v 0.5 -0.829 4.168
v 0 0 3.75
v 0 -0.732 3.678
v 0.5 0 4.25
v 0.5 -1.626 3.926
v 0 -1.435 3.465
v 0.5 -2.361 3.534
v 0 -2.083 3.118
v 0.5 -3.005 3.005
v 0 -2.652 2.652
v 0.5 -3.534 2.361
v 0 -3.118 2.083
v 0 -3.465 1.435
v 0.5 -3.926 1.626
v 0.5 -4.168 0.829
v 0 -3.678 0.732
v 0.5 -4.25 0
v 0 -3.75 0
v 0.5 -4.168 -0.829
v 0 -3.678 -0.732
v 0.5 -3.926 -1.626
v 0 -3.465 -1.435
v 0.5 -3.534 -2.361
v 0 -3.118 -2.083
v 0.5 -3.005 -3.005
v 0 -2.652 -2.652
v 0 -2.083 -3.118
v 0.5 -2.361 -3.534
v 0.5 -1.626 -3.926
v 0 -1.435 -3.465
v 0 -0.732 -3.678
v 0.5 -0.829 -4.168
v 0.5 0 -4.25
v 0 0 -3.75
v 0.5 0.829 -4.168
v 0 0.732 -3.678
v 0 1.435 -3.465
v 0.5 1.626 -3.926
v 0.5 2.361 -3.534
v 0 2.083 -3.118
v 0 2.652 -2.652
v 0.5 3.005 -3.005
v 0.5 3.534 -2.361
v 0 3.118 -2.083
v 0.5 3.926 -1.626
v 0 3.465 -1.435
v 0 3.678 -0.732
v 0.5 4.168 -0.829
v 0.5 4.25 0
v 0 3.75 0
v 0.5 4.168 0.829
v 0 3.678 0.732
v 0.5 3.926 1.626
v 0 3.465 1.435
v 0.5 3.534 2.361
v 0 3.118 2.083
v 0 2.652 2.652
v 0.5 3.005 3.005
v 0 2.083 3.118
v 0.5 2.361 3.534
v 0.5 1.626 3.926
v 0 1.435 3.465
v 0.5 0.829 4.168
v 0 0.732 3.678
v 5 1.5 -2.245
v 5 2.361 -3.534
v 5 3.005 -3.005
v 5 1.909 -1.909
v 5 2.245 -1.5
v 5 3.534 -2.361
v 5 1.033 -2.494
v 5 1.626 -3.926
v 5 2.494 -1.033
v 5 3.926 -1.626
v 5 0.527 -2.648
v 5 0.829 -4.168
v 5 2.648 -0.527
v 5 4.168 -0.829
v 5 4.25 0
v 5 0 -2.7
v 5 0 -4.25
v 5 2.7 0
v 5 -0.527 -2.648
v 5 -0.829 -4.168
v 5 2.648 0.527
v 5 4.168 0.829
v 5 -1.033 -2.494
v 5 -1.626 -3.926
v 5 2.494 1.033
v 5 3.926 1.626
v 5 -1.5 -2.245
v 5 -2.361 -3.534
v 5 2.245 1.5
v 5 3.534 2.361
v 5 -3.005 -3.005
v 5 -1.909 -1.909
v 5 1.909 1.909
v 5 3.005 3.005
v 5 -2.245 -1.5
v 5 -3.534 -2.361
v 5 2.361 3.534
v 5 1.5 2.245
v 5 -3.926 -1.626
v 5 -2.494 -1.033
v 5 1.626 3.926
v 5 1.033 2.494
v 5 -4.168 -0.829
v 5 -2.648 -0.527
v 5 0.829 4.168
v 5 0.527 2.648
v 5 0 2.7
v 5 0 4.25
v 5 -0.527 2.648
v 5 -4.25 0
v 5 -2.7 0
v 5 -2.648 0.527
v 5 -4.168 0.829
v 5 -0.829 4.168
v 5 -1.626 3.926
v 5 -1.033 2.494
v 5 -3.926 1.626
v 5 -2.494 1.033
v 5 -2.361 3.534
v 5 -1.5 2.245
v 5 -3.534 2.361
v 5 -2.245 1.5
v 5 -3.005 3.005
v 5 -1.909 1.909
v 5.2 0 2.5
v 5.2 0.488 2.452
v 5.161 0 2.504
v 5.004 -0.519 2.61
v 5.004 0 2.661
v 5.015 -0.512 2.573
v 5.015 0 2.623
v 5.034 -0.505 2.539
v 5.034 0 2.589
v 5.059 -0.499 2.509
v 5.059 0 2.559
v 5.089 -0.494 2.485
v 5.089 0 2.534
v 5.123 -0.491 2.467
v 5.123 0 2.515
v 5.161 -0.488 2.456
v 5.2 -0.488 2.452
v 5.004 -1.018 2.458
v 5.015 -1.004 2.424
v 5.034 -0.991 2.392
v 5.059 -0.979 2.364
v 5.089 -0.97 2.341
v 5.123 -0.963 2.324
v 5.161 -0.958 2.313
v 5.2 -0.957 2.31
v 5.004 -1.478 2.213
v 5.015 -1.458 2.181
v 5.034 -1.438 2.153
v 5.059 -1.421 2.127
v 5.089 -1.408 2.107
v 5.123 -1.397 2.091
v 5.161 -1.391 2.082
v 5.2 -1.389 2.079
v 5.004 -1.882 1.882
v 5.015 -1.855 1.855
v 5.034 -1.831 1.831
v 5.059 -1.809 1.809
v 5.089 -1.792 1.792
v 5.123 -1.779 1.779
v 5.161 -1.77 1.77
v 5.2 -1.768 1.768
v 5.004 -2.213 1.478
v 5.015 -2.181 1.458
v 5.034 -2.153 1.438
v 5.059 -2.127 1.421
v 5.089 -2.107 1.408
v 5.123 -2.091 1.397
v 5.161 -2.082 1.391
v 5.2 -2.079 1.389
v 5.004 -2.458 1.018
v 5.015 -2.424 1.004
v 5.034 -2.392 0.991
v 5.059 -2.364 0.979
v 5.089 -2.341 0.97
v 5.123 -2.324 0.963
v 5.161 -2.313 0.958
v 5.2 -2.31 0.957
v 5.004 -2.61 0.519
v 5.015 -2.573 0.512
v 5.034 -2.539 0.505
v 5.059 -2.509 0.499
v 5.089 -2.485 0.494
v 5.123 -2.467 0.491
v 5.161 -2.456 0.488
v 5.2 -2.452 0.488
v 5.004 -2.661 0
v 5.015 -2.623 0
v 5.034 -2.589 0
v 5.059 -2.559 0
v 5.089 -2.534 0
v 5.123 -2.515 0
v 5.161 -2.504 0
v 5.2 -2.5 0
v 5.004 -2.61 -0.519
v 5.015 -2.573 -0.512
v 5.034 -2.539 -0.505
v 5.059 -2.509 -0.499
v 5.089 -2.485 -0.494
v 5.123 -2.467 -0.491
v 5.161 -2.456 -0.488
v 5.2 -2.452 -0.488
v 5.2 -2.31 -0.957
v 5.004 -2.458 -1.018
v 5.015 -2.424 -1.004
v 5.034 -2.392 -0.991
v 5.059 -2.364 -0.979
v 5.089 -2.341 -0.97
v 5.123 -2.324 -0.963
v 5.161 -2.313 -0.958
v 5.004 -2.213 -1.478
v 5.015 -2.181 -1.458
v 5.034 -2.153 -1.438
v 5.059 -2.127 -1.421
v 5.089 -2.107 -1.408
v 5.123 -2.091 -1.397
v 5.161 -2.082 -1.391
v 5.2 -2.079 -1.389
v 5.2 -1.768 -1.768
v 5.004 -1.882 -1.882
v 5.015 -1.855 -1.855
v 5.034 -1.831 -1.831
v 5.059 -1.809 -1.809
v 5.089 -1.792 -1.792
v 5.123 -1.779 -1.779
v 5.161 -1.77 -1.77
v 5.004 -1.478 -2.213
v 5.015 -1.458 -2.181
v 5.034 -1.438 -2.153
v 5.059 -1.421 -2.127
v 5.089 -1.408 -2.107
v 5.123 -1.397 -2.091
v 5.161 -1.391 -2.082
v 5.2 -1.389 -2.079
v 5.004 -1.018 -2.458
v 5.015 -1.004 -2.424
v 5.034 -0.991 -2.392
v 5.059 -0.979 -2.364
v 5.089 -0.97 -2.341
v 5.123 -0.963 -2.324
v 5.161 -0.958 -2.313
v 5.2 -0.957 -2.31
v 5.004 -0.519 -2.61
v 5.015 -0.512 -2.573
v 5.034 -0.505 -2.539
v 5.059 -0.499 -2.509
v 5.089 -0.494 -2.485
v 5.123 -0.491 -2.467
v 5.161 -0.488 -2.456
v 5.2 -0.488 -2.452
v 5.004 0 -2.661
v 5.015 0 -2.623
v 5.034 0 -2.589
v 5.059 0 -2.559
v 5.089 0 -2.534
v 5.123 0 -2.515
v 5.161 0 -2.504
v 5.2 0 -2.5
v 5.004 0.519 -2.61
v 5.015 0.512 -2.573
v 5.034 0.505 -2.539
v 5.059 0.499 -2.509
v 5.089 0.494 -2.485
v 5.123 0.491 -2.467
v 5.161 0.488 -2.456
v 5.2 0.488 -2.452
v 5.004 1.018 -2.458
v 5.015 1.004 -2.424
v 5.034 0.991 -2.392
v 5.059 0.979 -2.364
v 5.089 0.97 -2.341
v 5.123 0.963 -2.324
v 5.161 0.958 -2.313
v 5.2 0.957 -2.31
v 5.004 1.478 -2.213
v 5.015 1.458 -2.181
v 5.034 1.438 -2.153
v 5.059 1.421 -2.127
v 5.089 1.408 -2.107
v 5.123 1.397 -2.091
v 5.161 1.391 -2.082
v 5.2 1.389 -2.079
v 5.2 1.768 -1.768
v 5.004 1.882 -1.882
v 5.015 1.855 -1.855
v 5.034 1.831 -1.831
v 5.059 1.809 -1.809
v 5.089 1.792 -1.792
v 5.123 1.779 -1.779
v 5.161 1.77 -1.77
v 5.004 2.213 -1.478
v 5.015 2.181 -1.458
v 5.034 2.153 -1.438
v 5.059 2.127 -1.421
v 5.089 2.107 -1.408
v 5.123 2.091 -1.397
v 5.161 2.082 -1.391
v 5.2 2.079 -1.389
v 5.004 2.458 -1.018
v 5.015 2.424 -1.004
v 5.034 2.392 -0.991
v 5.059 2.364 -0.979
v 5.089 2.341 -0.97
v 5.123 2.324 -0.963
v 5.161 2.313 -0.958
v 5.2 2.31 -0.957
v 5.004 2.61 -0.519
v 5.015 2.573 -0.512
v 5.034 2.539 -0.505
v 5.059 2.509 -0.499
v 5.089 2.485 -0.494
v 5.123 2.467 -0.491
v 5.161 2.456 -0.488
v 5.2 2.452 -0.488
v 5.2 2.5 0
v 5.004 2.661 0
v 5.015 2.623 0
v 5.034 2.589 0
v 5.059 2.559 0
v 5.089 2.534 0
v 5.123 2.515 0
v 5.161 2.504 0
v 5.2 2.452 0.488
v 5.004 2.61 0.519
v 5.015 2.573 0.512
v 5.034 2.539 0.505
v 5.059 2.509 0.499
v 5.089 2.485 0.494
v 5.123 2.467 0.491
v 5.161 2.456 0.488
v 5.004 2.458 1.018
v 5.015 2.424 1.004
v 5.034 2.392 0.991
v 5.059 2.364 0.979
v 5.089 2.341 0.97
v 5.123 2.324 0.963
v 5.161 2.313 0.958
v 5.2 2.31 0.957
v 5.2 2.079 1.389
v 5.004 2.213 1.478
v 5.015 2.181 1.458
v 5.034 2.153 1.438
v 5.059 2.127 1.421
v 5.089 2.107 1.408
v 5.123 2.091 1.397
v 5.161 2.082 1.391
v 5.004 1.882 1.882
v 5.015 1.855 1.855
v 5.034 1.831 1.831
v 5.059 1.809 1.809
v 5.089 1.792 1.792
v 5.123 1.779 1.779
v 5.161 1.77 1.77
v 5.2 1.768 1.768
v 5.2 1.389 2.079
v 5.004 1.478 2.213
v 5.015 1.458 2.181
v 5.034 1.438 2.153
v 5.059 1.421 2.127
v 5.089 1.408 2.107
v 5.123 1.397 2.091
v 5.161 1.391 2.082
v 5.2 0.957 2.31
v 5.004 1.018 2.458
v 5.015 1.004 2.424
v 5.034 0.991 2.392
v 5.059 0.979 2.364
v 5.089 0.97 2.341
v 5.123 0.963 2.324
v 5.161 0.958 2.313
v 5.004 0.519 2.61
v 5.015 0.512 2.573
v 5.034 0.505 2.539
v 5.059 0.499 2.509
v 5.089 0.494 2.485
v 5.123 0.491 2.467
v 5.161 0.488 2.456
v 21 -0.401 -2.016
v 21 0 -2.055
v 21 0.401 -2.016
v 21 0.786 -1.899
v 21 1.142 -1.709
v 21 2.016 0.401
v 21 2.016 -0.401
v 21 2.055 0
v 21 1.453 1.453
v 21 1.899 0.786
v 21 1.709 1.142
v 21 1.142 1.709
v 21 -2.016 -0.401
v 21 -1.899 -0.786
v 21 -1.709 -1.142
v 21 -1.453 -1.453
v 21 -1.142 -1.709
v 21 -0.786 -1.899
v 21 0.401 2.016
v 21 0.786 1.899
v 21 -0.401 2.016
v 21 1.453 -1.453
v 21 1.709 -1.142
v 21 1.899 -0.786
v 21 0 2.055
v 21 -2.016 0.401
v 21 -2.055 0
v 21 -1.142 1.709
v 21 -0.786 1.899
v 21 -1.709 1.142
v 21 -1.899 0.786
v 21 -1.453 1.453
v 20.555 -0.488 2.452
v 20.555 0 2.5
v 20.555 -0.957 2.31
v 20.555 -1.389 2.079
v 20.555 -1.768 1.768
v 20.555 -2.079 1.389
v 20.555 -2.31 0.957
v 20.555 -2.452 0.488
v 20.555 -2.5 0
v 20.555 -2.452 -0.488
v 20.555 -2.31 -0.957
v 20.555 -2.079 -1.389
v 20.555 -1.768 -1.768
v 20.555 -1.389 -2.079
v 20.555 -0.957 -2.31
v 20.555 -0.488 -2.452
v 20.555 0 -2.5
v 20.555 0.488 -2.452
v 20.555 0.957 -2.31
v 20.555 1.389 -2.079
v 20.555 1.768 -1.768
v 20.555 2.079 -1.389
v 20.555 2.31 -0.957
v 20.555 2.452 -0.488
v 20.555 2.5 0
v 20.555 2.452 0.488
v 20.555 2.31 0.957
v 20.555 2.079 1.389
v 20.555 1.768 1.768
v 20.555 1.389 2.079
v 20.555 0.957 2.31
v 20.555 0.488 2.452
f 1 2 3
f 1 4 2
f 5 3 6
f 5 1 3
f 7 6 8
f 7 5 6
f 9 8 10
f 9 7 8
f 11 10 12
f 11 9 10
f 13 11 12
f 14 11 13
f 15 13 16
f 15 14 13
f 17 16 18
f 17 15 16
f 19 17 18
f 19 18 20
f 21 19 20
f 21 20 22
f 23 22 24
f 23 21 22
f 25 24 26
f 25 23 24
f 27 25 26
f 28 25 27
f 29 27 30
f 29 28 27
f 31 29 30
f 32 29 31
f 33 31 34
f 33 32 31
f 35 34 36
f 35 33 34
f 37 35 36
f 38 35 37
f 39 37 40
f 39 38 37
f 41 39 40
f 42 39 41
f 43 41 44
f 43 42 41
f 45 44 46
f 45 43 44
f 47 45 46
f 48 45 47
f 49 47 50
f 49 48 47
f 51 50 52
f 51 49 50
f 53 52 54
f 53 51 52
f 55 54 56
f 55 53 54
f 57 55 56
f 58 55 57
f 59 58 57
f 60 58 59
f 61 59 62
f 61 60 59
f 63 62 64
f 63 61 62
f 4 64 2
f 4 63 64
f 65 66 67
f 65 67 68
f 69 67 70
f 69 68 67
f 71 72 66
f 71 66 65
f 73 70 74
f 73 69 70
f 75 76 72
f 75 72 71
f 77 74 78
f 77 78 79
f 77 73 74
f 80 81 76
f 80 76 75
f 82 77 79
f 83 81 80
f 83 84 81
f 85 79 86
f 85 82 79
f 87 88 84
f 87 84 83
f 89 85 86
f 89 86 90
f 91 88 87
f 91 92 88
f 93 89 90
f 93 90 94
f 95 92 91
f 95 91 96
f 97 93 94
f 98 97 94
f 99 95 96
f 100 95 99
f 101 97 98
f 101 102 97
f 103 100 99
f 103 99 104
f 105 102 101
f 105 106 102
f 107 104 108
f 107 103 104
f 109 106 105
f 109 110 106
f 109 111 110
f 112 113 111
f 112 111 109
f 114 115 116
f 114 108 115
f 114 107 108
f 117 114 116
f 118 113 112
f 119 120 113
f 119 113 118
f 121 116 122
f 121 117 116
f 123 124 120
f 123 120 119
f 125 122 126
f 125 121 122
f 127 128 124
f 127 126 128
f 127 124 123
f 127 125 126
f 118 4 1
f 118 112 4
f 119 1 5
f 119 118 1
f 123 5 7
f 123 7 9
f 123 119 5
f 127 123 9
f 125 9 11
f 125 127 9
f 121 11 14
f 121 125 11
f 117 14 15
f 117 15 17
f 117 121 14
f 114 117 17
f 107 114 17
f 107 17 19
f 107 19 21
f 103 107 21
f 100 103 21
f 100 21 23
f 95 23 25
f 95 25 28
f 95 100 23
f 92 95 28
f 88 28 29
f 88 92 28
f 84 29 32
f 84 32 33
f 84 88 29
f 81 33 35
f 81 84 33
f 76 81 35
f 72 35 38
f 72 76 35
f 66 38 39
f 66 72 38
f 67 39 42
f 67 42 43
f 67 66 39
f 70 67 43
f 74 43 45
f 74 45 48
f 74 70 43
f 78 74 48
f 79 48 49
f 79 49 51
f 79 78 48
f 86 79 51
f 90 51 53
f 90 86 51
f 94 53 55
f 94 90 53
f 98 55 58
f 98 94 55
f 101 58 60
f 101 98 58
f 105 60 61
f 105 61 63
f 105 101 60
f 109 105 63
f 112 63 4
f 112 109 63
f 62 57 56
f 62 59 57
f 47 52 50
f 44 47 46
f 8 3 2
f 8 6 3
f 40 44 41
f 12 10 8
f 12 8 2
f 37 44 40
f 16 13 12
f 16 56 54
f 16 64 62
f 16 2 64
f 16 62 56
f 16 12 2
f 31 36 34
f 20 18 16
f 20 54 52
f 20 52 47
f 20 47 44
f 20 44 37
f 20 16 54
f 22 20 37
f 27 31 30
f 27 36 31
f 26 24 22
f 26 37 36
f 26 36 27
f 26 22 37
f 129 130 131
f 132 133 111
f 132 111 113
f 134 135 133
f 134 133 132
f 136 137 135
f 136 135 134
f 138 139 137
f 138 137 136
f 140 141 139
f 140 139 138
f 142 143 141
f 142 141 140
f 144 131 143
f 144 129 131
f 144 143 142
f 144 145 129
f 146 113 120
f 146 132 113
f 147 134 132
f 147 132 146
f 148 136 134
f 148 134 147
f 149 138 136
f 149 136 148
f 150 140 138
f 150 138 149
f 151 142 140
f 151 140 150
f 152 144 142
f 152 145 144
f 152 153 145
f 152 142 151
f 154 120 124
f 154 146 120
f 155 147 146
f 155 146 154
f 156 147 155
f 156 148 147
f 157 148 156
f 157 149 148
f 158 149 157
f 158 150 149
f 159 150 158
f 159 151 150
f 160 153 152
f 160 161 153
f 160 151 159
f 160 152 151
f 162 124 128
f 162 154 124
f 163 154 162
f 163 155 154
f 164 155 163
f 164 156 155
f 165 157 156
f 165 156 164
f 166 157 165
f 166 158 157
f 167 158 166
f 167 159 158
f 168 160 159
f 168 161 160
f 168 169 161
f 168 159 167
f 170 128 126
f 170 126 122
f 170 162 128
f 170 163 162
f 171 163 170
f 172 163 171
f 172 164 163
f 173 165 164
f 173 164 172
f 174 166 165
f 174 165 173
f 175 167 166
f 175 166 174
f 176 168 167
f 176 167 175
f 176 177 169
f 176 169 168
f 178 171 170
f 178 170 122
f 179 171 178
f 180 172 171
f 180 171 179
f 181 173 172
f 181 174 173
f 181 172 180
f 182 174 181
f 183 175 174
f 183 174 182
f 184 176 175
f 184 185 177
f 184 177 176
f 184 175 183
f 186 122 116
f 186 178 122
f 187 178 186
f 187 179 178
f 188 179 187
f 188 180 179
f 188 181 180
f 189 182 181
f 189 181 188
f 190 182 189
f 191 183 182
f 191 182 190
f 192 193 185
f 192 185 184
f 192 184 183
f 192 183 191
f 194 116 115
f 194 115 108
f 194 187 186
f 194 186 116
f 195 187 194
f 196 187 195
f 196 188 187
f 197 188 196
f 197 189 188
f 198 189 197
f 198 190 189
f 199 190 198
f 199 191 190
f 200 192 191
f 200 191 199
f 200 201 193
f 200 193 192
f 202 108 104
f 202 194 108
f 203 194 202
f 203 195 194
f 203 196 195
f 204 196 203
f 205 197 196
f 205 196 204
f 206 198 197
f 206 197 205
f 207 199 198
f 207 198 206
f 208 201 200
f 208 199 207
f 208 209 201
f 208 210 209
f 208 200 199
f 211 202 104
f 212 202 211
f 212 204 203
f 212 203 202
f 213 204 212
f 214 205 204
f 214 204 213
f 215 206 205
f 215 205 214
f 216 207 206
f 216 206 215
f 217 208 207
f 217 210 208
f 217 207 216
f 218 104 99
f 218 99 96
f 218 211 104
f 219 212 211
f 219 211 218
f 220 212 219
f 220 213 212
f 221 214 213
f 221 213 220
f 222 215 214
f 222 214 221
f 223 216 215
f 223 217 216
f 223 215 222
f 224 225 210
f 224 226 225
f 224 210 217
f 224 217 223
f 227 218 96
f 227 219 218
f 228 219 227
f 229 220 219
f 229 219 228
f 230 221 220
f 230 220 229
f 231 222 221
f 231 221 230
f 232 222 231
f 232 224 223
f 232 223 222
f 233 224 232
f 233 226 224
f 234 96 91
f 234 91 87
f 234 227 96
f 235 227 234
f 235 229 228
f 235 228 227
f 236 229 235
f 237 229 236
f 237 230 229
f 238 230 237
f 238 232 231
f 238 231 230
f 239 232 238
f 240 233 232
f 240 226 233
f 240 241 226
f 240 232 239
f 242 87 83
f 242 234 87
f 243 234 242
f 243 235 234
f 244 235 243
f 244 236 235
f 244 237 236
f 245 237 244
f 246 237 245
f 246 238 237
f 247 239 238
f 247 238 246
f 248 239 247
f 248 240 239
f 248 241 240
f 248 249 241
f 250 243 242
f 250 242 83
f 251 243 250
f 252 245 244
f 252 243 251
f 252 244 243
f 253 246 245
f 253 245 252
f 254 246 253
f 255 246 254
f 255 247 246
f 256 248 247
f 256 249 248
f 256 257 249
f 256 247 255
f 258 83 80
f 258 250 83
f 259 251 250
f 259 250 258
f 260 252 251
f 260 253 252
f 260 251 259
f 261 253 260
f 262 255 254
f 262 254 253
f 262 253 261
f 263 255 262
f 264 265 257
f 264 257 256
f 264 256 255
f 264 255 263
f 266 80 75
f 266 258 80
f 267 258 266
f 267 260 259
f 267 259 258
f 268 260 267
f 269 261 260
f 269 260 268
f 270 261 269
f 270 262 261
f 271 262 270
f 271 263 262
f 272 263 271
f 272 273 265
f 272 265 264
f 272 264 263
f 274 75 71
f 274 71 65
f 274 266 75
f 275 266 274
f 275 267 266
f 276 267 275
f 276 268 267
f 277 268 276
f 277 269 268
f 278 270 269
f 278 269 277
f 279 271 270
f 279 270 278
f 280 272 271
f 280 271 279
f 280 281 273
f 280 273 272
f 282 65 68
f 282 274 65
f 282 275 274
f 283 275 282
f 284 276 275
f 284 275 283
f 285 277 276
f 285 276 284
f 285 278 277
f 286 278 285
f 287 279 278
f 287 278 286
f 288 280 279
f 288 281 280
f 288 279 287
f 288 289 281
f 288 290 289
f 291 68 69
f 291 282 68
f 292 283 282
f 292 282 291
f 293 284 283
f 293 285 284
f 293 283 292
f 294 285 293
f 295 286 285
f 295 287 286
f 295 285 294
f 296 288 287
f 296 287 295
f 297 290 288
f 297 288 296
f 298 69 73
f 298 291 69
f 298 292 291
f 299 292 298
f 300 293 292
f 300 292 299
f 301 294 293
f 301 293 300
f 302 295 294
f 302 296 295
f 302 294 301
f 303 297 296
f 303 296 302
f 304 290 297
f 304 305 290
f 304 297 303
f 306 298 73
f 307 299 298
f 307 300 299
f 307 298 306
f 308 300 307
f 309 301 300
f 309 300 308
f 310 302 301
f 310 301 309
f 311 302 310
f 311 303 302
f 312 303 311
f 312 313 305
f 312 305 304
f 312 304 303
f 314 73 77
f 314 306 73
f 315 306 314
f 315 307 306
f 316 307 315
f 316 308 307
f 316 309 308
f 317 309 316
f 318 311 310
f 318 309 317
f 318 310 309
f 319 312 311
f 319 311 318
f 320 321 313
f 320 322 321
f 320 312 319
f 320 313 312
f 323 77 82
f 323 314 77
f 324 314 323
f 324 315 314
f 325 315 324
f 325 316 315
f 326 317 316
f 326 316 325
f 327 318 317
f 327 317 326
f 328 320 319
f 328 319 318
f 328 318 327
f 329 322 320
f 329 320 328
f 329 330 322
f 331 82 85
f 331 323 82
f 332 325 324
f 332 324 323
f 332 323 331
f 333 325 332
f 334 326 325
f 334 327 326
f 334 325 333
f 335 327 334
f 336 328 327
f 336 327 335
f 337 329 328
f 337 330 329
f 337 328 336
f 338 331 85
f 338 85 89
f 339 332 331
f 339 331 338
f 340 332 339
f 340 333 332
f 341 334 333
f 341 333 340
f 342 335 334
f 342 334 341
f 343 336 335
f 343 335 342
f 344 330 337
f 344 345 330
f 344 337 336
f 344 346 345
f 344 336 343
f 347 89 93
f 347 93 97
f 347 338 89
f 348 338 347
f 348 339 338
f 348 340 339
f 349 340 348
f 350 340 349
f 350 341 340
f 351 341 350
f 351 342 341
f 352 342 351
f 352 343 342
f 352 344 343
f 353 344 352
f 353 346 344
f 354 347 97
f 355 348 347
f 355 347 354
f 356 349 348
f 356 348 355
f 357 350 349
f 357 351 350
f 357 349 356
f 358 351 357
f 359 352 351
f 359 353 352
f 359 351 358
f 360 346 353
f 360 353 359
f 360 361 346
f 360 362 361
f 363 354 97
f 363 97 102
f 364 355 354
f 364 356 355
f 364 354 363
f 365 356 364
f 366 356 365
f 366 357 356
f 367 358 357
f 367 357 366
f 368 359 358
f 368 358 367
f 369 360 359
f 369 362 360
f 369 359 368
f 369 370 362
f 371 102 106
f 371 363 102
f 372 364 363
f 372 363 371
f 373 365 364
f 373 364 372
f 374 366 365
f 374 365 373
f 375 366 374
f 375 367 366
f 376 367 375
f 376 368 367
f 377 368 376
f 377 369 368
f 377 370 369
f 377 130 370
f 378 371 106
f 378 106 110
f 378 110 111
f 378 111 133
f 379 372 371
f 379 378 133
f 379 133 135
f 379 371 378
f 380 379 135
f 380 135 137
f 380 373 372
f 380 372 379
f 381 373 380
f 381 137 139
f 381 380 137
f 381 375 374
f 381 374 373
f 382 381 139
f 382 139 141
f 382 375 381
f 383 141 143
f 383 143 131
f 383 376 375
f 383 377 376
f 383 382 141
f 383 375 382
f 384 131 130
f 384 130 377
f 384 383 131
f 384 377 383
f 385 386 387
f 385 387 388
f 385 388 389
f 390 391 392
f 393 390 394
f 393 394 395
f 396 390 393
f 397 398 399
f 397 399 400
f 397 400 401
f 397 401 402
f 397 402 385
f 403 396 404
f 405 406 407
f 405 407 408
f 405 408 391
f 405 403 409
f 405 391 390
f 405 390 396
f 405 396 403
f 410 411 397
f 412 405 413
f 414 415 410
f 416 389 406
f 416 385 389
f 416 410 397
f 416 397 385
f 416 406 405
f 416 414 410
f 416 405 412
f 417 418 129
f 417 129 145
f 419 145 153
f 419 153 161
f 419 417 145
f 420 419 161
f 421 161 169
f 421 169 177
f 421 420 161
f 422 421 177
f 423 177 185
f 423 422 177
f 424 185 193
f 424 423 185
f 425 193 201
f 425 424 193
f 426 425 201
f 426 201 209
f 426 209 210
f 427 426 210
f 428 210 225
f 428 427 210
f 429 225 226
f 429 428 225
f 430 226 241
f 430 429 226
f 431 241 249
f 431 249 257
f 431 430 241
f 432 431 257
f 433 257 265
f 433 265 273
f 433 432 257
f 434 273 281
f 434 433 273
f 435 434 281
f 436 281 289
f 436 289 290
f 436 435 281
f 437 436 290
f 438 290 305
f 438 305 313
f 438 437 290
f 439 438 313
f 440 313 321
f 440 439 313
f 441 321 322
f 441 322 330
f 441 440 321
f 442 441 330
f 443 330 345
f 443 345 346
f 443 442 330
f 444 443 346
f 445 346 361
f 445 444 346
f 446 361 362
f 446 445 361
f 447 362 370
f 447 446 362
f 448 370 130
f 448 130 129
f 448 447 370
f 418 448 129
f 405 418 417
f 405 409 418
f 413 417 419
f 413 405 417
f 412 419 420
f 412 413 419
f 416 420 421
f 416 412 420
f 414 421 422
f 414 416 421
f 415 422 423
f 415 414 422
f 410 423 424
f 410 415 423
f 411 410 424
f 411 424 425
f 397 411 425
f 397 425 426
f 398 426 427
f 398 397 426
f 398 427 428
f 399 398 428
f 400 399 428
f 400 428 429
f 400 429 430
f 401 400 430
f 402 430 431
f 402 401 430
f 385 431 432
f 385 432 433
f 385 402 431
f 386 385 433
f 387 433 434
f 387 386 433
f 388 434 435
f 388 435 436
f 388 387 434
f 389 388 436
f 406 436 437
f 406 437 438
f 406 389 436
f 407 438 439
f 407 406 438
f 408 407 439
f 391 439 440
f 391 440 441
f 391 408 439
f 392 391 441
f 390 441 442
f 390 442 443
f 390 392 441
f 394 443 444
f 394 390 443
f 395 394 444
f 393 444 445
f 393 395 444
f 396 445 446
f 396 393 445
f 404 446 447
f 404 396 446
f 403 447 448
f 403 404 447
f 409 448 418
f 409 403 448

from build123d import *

# Parameters (mm, degrees)
FILLET1_R = 0.2


with BuildPart() as part:
    # BodySke → Base-Revolve (revolve)
    with BuildSketch(Plane.XY):
        Polygon((0, 0), (0, 3.75), (0.5, 4.25), (5, 4.25), (5, 2.5), (20.555, 2.5), (21, 2.055), (21, 0), align=None)
    revolve(axis=Axis((-31.75, 0, 0), (1, 0, 0)))

    # Fillet1
    fillet1_edges = [part.edges().sort_by_distance(p)[0] for p in [
        (5, -2.5, 0),
    ]]
    fillet(fillet1_edges, radius=FILLET1_R)


solid = part.part
